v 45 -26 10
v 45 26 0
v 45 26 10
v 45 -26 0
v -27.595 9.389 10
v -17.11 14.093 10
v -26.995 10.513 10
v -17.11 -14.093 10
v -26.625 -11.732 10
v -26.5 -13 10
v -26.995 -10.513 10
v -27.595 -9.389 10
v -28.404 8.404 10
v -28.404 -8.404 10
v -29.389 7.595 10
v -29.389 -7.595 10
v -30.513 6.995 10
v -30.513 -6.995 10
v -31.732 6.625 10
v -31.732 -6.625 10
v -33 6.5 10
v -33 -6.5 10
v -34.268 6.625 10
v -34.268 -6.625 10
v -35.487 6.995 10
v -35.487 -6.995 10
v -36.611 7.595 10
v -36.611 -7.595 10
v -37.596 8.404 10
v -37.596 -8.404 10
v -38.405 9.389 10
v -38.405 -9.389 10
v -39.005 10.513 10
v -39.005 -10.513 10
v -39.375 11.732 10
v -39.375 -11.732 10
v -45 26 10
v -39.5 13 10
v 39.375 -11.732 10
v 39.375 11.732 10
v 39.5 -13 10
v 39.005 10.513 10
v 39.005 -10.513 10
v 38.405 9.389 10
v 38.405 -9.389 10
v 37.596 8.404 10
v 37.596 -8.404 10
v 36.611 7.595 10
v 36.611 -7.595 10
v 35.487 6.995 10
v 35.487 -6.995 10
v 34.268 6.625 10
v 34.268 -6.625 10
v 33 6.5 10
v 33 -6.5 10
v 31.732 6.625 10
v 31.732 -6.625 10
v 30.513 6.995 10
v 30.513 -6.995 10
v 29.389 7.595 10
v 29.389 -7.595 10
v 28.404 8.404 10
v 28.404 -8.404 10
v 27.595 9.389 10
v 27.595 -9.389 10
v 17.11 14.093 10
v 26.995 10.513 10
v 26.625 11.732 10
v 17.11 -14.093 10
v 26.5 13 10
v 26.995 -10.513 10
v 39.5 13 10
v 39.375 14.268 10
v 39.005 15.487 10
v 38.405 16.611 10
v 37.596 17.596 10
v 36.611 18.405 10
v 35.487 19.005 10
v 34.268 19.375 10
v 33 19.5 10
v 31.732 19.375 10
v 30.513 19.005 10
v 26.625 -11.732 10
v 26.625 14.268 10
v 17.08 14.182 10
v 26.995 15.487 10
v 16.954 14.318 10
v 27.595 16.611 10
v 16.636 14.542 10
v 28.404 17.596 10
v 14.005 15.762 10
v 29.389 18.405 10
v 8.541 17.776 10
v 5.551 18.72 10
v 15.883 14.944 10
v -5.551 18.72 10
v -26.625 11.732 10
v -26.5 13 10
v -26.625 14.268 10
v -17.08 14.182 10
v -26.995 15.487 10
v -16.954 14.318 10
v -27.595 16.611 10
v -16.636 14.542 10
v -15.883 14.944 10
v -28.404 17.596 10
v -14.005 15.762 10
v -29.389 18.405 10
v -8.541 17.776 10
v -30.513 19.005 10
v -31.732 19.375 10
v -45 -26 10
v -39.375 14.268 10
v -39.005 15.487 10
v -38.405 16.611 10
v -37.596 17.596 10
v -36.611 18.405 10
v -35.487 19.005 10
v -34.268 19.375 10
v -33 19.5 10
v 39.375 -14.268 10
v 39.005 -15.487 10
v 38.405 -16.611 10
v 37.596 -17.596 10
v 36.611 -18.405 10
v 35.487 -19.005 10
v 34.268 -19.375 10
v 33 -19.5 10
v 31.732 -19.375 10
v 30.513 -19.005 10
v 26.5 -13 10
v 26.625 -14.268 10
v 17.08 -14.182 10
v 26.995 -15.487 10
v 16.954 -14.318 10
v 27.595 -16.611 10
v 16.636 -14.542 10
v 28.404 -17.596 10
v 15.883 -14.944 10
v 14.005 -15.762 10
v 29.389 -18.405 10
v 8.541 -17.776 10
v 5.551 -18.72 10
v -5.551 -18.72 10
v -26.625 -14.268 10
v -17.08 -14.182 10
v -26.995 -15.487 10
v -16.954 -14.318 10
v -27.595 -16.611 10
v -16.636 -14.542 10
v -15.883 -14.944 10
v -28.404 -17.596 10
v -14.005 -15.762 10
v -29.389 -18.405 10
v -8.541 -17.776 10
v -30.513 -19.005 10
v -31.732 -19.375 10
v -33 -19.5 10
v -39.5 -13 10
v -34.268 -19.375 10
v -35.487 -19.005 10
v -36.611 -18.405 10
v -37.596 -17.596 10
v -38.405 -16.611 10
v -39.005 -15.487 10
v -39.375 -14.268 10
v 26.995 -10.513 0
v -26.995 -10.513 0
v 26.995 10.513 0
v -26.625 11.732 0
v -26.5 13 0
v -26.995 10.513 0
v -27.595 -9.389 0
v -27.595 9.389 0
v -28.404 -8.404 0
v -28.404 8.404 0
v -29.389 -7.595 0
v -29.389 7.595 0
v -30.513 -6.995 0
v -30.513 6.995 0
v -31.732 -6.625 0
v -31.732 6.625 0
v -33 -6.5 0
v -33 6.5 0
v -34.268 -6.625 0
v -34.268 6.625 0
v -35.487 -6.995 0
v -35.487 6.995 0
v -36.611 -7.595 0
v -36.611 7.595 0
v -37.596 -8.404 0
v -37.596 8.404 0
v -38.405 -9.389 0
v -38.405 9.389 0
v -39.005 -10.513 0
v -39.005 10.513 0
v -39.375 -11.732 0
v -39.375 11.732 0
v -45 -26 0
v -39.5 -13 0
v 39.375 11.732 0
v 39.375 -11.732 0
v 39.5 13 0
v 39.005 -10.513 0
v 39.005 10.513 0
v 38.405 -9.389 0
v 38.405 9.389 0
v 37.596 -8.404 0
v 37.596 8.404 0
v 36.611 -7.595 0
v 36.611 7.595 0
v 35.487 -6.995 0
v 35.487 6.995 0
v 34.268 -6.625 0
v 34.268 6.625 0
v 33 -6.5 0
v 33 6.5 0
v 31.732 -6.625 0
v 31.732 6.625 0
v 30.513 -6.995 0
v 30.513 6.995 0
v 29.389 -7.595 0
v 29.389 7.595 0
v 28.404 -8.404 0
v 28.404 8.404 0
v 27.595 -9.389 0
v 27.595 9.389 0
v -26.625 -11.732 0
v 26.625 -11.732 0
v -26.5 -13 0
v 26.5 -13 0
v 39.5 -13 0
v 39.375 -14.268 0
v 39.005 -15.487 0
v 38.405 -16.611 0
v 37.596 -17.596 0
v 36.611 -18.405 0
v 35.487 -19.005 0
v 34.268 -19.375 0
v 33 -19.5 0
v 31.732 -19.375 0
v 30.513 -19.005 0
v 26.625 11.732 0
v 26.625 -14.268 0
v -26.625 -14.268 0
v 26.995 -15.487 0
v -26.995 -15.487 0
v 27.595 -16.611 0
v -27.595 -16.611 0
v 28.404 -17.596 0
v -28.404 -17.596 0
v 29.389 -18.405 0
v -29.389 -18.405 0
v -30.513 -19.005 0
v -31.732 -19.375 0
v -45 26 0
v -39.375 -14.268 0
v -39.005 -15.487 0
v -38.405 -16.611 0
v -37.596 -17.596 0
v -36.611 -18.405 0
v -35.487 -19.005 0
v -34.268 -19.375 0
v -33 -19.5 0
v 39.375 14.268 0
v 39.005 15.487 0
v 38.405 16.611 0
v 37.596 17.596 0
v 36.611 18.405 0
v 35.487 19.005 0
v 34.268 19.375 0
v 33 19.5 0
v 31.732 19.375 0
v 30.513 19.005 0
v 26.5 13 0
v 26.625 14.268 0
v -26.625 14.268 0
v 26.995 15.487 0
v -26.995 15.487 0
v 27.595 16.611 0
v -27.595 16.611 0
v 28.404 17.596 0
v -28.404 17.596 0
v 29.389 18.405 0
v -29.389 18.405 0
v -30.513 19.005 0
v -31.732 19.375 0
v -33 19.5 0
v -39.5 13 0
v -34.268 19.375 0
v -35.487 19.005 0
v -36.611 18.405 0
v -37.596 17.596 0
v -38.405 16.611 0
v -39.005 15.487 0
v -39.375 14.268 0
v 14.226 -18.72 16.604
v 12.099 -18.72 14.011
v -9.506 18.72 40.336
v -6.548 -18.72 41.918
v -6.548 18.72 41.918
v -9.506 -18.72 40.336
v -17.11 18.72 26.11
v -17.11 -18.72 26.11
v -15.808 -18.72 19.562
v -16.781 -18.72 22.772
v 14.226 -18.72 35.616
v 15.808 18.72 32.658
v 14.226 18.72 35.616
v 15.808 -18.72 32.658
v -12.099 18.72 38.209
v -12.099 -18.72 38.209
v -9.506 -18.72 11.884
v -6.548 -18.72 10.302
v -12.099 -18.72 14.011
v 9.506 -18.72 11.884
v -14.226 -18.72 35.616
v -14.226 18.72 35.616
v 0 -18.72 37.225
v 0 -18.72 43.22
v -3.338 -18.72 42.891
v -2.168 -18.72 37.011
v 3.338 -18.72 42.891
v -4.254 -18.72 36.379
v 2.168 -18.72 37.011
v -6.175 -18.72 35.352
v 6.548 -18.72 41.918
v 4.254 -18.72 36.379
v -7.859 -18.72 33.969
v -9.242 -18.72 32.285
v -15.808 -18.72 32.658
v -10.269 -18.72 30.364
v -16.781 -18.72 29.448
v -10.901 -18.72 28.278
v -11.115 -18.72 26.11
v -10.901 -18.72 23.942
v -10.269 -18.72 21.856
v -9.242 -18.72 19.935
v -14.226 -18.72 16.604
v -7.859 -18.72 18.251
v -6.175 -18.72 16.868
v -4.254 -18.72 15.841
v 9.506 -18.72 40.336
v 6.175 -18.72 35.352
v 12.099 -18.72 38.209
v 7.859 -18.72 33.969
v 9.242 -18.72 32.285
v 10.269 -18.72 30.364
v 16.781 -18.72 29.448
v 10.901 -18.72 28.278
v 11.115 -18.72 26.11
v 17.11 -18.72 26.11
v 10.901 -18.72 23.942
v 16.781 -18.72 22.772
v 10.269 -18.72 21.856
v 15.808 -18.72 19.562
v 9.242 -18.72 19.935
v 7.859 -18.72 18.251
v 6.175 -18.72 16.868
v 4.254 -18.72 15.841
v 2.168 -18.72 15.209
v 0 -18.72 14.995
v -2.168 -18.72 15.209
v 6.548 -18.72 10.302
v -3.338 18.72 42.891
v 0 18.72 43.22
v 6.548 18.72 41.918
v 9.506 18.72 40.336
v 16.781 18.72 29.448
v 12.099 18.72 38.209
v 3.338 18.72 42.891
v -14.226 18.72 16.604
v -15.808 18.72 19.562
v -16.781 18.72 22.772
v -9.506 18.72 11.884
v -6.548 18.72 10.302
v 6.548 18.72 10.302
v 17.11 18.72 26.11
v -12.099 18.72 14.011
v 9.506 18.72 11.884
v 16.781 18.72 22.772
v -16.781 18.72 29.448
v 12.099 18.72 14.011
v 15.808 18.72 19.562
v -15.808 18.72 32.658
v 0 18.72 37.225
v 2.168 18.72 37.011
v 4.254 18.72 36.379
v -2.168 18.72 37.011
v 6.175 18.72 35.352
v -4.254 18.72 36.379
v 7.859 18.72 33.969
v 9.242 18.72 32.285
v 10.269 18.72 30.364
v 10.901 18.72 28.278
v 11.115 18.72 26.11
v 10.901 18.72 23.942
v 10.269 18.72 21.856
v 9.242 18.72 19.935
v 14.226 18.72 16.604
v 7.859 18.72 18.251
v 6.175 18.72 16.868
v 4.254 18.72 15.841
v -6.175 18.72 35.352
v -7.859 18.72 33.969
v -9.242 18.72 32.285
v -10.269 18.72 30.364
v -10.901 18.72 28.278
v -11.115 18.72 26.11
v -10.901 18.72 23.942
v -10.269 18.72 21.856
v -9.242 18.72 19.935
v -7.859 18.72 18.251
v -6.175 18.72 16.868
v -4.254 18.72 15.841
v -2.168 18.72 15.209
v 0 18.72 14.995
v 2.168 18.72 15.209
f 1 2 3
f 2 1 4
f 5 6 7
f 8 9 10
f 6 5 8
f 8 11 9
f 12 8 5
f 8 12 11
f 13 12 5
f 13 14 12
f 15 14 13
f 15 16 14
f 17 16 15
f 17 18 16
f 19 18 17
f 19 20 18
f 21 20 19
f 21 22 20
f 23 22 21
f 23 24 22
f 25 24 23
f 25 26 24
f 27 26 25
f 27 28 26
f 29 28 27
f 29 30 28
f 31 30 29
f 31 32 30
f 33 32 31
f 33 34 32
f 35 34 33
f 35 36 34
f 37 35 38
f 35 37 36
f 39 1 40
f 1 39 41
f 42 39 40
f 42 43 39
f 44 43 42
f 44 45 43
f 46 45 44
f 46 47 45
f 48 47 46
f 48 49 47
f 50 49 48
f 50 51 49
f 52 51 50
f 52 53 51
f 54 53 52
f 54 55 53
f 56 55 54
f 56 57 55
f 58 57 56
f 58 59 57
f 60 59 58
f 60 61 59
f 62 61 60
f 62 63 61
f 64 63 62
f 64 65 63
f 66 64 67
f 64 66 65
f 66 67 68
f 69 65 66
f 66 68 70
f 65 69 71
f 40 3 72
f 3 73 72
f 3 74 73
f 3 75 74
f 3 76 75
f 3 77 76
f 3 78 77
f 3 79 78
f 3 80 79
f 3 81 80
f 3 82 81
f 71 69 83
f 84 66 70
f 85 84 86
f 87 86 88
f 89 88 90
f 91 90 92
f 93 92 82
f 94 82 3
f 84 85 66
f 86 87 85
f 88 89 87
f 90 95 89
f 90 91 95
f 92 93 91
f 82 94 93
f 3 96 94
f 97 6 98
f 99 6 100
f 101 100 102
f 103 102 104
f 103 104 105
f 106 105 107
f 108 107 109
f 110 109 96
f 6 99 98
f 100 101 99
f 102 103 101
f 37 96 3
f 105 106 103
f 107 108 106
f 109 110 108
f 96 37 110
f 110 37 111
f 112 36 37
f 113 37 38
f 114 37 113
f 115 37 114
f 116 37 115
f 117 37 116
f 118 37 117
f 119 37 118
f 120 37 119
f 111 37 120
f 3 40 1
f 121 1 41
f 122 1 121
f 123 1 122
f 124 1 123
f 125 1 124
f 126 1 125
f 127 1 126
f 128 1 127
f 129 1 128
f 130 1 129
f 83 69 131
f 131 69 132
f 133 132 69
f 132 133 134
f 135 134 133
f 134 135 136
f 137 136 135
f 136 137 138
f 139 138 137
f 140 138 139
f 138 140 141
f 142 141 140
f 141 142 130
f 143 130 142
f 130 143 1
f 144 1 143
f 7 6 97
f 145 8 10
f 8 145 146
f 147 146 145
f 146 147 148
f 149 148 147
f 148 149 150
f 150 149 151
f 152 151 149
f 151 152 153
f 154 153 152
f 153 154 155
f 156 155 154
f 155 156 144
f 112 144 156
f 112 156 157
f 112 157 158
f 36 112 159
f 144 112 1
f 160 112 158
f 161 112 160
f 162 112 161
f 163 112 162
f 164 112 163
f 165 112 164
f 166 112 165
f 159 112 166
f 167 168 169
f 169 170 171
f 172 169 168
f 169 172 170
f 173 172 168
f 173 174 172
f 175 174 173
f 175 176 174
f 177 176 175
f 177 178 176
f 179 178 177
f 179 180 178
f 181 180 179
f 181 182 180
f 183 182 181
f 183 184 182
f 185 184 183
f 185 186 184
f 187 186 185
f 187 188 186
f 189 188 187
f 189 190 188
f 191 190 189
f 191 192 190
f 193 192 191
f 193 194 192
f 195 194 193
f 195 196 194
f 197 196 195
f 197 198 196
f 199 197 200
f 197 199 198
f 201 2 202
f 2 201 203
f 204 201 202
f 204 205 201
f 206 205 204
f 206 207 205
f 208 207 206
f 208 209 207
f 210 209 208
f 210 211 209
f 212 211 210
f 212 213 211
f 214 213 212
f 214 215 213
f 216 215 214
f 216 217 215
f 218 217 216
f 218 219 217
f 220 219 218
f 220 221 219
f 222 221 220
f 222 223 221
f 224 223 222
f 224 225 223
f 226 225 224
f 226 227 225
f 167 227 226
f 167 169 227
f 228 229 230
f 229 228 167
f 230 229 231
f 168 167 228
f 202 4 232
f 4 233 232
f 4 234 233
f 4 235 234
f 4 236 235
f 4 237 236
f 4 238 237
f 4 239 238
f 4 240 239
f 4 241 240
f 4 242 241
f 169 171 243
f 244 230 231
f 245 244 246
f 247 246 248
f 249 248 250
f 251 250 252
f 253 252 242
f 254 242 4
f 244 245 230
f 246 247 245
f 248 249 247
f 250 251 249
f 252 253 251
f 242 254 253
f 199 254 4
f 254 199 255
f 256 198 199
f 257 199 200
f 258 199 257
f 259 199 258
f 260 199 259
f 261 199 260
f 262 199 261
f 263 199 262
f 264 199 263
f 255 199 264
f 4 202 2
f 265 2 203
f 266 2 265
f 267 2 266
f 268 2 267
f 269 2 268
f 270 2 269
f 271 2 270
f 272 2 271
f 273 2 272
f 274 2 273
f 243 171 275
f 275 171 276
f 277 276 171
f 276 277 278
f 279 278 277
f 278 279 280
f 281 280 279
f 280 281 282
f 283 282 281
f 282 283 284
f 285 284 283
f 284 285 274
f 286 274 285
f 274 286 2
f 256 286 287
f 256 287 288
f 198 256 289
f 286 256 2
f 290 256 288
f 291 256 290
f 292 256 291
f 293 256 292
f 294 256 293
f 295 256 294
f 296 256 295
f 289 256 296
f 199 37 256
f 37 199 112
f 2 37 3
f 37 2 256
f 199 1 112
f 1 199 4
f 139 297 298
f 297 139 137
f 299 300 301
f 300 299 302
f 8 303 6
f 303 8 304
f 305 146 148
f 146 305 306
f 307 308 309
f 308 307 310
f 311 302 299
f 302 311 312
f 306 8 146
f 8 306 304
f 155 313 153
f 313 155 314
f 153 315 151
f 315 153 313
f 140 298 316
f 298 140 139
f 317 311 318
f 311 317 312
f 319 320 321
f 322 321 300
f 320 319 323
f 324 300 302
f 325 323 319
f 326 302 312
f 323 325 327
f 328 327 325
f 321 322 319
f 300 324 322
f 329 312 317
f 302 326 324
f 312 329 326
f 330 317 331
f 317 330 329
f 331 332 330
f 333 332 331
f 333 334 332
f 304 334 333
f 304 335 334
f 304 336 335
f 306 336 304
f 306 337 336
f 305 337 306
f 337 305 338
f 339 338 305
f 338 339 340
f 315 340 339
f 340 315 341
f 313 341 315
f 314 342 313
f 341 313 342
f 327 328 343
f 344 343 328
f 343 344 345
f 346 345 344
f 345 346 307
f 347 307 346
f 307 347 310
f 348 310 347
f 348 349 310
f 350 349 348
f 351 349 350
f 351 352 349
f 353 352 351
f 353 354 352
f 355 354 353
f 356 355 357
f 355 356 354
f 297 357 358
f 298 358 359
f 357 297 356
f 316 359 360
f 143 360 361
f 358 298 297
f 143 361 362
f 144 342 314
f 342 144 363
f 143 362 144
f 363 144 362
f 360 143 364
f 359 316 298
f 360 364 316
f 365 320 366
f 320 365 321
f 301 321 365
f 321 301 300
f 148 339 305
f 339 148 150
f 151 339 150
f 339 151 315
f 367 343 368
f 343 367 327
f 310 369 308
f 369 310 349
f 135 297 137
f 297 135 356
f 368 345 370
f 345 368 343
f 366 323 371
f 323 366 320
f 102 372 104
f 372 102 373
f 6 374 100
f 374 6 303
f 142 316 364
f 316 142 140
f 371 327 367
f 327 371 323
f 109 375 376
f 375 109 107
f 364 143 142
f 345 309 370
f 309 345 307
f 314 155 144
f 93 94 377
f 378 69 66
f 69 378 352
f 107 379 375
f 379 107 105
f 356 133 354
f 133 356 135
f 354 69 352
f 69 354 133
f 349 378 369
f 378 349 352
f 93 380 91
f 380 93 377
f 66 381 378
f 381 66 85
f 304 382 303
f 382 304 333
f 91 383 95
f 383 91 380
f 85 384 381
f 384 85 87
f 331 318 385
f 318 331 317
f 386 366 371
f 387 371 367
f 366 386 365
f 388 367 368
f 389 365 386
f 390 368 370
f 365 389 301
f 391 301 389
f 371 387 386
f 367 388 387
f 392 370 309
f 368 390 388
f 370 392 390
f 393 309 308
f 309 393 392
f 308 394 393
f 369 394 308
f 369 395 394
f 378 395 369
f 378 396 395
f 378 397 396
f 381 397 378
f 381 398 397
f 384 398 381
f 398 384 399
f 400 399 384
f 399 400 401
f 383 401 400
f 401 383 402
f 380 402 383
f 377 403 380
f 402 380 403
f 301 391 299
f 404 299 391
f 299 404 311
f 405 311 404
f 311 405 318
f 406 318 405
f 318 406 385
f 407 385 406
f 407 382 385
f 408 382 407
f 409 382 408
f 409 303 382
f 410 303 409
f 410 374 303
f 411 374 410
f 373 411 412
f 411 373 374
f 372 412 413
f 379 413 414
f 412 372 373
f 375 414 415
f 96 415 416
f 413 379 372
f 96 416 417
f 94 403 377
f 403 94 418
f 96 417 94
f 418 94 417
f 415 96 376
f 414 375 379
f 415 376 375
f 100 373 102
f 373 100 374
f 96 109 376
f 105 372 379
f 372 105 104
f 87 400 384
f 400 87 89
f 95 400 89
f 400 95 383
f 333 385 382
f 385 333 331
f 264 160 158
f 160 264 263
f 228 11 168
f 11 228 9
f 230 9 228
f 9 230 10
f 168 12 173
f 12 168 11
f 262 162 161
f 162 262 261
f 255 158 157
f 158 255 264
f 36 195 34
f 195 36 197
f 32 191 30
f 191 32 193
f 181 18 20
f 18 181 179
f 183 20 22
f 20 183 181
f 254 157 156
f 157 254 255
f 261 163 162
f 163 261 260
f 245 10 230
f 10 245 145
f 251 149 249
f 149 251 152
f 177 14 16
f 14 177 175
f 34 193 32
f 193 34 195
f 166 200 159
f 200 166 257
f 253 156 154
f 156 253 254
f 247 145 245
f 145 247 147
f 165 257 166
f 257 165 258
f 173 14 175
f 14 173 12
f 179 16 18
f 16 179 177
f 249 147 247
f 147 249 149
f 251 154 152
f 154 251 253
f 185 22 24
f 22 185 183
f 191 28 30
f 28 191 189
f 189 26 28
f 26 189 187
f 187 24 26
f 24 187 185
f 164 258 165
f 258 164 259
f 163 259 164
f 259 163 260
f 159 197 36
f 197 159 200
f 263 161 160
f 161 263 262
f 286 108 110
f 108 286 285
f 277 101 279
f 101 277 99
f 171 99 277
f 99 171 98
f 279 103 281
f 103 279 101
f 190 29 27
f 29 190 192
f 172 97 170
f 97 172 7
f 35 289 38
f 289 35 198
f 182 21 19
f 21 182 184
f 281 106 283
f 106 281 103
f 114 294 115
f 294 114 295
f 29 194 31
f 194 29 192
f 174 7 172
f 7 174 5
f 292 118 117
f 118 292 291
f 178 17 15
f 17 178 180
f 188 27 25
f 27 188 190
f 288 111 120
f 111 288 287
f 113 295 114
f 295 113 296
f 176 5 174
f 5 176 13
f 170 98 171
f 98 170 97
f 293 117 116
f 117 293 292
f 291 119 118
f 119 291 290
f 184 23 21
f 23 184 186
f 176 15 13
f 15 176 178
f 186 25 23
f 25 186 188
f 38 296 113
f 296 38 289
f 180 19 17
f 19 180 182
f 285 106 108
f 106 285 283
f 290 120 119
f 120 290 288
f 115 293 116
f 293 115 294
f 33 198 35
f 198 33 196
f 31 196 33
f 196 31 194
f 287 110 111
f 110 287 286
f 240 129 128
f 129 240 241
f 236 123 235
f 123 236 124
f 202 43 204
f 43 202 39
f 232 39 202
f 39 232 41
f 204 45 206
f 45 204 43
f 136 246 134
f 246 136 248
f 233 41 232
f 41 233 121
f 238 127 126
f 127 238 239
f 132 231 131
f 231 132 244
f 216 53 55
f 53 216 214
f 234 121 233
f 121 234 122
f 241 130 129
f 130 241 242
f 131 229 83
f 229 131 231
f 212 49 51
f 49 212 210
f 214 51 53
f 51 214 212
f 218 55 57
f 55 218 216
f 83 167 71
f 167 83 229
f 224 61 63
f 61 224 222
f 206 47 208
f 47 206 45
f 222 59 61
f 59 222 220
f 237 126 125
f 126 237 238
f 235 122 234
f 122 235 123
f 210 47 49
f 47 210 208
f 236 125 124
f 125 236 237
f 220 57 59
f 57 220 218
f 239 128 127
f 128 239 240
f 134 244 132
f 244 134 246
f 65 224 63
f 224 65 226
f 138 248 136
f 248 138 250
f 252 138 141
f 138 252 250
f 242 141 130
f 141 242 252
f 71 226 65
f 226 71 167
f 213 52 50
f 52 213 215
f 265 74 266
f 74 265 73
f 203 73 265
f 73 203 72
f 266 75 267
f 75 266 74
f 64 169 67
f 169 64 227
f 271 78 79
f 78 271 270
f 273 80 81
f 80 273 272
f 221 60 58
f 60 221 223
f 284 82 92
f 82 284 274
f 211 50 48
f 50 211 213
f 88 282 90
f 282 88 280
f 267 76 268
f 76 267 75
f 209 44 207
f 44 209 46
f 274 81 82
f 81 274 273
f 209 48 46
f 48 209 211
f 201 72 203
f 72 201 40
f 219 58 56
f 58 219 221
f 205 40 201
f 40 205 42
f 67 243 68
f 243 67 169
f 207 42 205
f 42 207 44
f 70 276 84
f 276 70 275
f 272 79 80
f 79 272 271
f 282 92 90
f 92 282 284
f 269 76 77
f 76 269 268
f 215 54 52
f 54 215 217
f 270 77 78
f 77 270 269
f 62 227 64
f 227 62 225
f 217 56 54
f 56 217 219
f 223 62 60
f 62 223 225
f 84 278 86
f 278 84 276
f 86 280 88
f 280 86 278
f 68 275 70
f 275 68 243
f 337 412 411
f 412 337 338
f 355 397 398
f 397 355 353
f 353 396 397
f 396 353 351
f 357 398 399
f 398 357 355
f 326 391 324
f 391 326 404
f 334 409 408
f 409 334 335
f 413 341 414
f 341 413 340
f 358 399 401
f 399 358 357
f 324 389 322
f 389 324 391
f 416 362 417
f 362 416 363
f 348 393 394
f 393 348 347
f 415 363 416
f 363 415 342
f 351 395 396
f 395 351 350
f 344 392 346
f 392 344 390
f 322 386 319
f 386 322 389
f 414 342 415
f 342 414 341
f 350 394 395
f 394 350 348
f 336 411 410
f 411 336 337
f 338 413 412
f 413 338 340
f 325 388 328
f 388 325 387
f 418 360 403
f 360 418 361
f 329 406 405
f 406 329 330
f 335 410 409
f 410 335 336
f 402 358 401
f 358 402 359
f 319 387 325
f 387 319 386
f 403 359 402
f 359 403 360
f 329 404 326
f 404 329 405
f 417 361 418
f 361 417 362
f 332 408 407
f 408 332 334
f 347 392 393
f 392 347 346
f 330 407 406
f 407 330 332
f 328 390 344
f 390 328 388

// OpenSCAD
$fn = 32;

// ----------------------------------------------------------------------
// Bearing block: 90 x 52 mm base, 22.23 mm bore at 26.11 mm
// ----------------------------------------------------------------------

// --- parameters (mm) ---
base_w = 90;              // base width
base_d = 52;              // base depth
base_t = 10;              // base thickness
bore_d = 22.23;           // shaft / bearing bore
house_r = 17.11;          // housing outer radius
house_len = 37.44;        // housing length along the shaft
foot_w = 34.22;           // foot width under the housing
foot_len = 27.44;         // foot length along the shaft
axis_z = 26.11;           // bore axis height above the base
holes_d = 13;             // mounting holes
hole_x = 33;              // mounting hole spacing

difference() {
  union() {
    /* base plate with its underside on z = 0 */
    translate([0, 0, base_t / 2]) cube([base_w, base_d, base_t], center = true);
    /* hull foot: a straight web blending into the round housing */
    hull() {
      translate([0, 0, base_t - 0.5]) cube([foot_w, foot_len, 1.6], center = true);
      translate([0, 0, axis_z]) rotate([-90, 0, 0]) cylinder(h = house_len, d = 2 * house_r, center = true);
    }
  }
  /* bore through the housing, 2.5 mm clear on both sides */
  translate([0, 0, axis_z]) rotate([-90, 0, 0]) cylinder(h = house_len + 5, d = bore_d, center = true);
  /* mounting holes through the base plate */
  for (hx = [-33, 33]) {
    for (hy = [-13, 13]) {
      translate([hx, hy, -2.5]) cylinder(h = base_t + 5, d = holes_d);
    }
  }
}
